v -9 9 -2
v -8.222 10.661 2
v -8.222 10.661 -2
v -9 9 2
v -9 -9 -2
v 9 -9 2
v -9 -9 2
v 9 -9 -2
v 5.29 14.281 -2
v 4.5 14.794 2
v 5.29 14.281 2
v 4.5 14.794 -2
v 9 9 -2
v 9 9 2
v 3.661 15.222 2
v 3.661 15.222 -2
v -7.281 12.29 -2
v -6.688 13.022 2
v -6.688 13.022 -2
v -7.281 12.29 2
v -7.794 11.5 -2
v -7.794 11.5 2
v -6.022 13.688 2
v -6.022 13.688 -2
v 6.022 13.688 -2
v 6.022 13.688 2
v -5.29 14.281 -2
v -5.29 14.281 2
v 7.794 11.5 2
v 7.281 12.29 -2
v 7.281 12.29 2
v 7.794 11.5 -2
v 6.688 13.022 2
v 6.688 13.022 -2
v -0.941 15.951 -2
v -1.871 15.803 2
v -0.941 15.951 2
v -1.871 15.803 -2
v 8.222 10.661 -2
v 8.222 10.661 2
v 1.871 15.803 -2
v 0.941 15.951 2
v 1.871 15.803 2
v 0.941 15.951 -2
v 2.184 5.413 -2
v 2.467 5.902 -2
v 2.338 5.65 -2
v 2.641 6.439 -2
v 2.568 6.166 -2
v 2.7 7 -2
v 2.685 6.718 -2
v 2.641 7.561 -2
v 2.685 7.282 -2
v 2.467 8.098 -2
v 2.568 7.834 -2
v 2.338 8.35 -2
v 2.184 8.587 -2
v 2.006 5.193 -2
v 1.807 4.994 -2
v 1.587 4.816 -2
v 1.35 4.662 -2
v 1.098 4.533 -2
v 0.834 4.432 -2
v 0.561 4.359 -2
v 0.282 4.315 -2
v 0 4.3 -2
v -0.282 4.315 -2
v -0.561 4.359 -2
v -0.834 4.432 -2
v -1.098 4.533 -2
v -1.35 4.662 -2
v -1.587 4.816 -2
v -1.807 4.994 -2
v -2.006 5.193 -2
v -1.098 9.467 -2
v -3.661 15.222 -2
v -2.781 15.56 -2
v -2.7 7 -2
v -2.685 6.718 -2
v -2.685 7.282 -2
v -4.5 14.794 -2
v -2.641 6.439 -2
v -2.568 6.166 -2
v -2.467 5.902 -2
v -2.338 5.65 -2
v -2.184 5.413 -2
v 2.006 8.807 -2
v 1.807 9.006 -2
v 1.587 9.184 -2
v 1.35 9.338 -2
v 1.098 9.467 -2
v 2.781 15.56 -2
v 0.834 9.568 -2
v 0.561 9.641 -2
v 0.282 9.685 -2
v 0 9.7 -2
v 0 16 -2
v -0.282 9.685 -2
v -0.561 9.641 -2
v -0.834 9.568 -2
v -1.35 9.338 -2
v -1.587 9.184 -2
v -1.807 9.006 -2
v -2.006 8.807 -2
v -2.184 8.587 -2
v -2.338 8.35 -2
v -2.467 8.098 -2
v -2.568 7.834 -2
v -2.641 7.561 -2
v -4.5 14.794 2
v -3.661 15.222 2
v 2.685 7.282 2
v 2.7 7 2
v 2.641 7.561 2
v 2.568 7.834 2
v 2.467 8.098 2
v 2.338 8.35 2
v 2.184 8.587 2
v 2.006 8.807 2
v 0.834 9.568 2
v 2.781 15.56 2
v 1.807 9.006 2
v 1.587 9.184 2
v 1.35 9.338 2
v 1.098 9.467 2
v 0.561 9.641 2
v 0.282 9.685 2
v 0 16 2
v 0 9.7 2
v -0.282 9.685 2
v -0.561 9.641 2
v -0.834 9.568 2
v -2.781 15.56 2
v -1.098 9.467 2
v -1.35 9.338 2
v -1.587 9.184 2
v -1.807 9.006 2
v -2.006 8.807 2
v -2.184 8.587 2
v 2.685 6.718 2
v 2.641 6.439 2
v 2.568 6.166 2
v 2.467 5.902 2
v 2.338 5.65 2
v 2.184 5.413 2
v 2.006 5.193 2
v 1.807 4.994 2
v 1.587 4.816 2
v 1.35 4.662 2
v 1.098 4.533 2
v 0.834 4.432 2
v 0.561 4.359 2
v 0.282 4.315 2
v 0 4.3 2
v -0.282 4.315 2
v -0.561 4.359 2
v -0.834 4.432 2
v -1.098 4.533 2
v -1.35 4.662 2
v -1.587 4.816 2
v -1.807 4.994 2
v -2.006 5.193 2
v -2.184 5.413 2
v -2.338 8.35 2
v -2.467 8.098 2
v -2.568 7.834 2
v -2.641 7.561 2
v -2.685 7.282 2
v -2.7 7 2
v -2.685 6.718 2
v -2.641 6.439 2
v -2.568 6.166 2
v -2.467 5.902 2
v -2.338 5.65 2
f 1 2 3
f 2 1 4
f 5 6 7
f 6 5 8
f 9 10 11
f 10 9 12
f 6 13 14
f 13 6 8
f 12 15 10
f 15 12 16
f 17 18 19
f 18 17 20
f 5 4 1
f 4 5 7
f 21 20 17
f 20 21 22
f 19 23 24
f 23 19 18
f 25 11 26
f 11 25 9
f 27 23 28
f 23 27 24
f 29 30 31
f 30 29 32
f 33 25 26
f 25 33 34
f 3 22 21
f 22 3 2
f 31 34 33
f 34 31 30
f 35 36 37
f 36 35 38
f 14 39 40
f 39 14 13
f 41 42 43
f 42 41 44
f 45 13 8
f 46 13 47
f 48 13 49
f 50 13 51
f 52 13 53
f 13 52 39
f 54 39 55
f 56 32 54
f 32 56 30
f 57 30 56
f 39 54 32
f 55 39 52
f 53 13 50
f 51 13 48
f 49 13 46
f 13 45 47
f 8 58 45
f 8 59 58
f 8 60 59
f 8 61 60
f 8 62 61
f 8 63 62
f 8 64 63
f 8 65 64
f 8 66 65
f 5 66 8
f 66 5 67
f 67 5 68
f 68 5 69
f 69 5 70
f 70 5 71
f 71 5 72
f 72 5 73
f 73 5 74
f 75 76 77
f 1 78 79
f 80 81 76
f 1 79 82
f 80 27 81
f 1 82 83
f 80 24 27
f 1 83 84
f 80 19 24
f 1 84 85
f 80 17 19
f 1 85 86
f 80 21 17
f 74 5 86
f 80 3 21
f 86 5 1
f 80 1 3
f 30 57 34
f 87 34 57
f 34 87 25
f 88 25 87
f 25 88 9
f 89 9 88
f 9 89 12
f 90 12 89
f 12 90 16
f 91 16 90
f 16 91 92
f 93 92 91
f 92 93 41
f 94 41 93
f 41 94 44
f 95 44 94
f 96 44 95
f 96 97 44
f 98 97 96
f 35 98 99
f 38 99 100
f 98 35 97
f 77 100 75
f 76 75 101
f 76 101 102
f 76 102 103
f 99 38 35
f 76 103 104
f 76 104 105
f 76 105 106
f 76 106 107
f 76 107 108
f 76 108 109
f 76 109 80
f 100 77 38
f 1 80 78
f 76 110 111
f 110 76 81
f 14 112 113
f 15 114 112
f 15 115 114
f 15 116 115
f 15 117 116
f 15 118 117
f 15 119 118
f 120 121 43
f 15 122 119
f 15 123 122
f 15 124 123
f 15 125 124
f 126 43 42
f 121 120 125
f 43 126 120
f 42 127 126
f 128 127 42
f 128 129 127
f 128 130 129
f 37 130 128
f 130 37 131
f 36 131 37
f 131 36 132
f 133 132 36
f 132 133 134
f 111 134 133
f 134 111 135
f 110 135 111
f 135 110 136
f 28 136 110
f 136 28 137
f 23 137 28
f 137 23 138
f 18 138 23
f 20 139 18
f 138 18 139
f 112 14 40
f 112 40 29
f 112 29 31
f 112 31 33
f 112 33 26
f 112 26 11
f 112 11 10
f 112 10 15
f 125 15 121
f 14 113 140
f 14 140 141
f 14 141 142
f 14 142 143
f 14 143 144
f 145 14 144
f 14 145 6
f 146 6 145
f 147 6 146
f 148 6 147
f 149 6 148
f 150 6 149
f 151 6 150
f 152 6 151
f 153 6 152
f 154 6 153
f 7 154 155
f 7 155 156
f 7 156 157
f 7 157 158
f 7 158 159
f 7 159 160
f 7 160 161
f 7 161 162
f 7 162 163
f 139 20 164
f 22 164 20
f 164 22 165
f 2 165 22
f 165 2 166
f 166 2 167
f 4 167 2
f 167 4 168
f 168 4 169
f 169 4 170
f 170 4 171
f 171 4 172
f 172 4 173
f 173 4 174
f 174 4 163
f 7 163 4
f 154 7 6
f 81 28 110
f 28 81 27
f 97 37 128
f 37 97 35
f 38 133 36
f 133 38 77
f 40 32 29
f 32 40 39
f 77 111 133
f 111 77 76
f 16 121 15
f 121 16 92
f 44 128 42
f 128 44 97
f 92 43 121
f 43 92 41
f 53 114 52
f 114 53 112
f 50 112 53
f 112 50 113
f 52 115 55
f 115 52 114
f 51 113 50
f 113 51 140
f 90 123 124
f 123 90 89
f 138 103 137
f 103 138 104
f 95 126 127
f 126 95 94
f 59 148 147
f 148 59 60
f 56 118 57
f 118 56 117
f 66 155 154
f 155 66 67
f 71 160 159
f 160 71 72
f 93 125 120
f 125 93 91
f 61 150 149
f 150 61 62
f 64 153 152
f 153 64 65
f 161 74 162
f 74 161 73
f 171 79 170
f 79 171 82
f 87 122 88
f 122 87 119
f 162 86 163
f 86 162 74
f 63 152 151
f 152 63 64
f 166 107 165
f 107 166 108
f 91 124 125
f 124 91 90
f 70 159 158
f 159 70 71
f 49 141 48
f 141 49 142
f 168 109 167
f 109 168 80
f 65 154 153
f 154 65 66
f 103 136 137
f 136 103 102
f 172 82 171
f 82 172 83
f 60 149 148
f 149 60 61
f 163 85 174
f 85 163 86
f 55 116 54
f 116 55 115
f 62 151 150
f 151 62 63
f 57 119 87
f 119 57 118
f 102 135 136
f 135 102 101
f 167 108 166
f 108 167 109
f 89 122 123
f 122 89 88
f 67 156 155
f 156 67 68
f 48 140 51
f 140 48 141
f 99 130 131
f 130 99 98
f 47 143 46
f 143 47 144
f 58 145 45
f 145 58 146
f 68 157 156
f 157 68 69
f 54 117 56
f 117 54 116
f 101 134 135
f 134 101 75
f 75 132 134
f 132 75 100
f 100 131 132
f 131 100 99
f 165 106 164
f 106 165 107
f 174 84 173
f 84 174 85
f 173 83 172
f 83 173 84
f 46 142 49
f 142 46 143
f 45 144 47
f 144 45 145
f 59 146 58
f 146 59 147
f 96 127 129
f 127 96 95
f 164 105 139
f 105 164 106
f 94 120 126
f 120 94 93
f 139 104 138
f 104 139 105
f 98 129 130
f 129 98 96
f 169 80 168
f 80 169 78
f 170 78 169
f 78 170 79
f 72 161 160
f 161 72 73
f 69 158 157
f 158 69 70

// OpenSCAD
// Single-hole mounting tab.
$fn = 60;
eps = 0.02;
tab_w = 18;
tab_h = 32;
tab_t = 4;
hole_d = 5.4;
difference() {
    hull() {
        translate([0, 0, 0]) cube([tab_w, tab_w, tab_t], center = true);
        translate([0, tab_h / 2 - tab_w / 2, 0]) cylinder(d = tab_w, h = tab_t, center = true);
    }
    translate([0, tab_h / 2 - tab_w / 2, -tab_t / 2 - eps]) cylinder(d = hole_d, h = tab_t + 2 * eps);
}
